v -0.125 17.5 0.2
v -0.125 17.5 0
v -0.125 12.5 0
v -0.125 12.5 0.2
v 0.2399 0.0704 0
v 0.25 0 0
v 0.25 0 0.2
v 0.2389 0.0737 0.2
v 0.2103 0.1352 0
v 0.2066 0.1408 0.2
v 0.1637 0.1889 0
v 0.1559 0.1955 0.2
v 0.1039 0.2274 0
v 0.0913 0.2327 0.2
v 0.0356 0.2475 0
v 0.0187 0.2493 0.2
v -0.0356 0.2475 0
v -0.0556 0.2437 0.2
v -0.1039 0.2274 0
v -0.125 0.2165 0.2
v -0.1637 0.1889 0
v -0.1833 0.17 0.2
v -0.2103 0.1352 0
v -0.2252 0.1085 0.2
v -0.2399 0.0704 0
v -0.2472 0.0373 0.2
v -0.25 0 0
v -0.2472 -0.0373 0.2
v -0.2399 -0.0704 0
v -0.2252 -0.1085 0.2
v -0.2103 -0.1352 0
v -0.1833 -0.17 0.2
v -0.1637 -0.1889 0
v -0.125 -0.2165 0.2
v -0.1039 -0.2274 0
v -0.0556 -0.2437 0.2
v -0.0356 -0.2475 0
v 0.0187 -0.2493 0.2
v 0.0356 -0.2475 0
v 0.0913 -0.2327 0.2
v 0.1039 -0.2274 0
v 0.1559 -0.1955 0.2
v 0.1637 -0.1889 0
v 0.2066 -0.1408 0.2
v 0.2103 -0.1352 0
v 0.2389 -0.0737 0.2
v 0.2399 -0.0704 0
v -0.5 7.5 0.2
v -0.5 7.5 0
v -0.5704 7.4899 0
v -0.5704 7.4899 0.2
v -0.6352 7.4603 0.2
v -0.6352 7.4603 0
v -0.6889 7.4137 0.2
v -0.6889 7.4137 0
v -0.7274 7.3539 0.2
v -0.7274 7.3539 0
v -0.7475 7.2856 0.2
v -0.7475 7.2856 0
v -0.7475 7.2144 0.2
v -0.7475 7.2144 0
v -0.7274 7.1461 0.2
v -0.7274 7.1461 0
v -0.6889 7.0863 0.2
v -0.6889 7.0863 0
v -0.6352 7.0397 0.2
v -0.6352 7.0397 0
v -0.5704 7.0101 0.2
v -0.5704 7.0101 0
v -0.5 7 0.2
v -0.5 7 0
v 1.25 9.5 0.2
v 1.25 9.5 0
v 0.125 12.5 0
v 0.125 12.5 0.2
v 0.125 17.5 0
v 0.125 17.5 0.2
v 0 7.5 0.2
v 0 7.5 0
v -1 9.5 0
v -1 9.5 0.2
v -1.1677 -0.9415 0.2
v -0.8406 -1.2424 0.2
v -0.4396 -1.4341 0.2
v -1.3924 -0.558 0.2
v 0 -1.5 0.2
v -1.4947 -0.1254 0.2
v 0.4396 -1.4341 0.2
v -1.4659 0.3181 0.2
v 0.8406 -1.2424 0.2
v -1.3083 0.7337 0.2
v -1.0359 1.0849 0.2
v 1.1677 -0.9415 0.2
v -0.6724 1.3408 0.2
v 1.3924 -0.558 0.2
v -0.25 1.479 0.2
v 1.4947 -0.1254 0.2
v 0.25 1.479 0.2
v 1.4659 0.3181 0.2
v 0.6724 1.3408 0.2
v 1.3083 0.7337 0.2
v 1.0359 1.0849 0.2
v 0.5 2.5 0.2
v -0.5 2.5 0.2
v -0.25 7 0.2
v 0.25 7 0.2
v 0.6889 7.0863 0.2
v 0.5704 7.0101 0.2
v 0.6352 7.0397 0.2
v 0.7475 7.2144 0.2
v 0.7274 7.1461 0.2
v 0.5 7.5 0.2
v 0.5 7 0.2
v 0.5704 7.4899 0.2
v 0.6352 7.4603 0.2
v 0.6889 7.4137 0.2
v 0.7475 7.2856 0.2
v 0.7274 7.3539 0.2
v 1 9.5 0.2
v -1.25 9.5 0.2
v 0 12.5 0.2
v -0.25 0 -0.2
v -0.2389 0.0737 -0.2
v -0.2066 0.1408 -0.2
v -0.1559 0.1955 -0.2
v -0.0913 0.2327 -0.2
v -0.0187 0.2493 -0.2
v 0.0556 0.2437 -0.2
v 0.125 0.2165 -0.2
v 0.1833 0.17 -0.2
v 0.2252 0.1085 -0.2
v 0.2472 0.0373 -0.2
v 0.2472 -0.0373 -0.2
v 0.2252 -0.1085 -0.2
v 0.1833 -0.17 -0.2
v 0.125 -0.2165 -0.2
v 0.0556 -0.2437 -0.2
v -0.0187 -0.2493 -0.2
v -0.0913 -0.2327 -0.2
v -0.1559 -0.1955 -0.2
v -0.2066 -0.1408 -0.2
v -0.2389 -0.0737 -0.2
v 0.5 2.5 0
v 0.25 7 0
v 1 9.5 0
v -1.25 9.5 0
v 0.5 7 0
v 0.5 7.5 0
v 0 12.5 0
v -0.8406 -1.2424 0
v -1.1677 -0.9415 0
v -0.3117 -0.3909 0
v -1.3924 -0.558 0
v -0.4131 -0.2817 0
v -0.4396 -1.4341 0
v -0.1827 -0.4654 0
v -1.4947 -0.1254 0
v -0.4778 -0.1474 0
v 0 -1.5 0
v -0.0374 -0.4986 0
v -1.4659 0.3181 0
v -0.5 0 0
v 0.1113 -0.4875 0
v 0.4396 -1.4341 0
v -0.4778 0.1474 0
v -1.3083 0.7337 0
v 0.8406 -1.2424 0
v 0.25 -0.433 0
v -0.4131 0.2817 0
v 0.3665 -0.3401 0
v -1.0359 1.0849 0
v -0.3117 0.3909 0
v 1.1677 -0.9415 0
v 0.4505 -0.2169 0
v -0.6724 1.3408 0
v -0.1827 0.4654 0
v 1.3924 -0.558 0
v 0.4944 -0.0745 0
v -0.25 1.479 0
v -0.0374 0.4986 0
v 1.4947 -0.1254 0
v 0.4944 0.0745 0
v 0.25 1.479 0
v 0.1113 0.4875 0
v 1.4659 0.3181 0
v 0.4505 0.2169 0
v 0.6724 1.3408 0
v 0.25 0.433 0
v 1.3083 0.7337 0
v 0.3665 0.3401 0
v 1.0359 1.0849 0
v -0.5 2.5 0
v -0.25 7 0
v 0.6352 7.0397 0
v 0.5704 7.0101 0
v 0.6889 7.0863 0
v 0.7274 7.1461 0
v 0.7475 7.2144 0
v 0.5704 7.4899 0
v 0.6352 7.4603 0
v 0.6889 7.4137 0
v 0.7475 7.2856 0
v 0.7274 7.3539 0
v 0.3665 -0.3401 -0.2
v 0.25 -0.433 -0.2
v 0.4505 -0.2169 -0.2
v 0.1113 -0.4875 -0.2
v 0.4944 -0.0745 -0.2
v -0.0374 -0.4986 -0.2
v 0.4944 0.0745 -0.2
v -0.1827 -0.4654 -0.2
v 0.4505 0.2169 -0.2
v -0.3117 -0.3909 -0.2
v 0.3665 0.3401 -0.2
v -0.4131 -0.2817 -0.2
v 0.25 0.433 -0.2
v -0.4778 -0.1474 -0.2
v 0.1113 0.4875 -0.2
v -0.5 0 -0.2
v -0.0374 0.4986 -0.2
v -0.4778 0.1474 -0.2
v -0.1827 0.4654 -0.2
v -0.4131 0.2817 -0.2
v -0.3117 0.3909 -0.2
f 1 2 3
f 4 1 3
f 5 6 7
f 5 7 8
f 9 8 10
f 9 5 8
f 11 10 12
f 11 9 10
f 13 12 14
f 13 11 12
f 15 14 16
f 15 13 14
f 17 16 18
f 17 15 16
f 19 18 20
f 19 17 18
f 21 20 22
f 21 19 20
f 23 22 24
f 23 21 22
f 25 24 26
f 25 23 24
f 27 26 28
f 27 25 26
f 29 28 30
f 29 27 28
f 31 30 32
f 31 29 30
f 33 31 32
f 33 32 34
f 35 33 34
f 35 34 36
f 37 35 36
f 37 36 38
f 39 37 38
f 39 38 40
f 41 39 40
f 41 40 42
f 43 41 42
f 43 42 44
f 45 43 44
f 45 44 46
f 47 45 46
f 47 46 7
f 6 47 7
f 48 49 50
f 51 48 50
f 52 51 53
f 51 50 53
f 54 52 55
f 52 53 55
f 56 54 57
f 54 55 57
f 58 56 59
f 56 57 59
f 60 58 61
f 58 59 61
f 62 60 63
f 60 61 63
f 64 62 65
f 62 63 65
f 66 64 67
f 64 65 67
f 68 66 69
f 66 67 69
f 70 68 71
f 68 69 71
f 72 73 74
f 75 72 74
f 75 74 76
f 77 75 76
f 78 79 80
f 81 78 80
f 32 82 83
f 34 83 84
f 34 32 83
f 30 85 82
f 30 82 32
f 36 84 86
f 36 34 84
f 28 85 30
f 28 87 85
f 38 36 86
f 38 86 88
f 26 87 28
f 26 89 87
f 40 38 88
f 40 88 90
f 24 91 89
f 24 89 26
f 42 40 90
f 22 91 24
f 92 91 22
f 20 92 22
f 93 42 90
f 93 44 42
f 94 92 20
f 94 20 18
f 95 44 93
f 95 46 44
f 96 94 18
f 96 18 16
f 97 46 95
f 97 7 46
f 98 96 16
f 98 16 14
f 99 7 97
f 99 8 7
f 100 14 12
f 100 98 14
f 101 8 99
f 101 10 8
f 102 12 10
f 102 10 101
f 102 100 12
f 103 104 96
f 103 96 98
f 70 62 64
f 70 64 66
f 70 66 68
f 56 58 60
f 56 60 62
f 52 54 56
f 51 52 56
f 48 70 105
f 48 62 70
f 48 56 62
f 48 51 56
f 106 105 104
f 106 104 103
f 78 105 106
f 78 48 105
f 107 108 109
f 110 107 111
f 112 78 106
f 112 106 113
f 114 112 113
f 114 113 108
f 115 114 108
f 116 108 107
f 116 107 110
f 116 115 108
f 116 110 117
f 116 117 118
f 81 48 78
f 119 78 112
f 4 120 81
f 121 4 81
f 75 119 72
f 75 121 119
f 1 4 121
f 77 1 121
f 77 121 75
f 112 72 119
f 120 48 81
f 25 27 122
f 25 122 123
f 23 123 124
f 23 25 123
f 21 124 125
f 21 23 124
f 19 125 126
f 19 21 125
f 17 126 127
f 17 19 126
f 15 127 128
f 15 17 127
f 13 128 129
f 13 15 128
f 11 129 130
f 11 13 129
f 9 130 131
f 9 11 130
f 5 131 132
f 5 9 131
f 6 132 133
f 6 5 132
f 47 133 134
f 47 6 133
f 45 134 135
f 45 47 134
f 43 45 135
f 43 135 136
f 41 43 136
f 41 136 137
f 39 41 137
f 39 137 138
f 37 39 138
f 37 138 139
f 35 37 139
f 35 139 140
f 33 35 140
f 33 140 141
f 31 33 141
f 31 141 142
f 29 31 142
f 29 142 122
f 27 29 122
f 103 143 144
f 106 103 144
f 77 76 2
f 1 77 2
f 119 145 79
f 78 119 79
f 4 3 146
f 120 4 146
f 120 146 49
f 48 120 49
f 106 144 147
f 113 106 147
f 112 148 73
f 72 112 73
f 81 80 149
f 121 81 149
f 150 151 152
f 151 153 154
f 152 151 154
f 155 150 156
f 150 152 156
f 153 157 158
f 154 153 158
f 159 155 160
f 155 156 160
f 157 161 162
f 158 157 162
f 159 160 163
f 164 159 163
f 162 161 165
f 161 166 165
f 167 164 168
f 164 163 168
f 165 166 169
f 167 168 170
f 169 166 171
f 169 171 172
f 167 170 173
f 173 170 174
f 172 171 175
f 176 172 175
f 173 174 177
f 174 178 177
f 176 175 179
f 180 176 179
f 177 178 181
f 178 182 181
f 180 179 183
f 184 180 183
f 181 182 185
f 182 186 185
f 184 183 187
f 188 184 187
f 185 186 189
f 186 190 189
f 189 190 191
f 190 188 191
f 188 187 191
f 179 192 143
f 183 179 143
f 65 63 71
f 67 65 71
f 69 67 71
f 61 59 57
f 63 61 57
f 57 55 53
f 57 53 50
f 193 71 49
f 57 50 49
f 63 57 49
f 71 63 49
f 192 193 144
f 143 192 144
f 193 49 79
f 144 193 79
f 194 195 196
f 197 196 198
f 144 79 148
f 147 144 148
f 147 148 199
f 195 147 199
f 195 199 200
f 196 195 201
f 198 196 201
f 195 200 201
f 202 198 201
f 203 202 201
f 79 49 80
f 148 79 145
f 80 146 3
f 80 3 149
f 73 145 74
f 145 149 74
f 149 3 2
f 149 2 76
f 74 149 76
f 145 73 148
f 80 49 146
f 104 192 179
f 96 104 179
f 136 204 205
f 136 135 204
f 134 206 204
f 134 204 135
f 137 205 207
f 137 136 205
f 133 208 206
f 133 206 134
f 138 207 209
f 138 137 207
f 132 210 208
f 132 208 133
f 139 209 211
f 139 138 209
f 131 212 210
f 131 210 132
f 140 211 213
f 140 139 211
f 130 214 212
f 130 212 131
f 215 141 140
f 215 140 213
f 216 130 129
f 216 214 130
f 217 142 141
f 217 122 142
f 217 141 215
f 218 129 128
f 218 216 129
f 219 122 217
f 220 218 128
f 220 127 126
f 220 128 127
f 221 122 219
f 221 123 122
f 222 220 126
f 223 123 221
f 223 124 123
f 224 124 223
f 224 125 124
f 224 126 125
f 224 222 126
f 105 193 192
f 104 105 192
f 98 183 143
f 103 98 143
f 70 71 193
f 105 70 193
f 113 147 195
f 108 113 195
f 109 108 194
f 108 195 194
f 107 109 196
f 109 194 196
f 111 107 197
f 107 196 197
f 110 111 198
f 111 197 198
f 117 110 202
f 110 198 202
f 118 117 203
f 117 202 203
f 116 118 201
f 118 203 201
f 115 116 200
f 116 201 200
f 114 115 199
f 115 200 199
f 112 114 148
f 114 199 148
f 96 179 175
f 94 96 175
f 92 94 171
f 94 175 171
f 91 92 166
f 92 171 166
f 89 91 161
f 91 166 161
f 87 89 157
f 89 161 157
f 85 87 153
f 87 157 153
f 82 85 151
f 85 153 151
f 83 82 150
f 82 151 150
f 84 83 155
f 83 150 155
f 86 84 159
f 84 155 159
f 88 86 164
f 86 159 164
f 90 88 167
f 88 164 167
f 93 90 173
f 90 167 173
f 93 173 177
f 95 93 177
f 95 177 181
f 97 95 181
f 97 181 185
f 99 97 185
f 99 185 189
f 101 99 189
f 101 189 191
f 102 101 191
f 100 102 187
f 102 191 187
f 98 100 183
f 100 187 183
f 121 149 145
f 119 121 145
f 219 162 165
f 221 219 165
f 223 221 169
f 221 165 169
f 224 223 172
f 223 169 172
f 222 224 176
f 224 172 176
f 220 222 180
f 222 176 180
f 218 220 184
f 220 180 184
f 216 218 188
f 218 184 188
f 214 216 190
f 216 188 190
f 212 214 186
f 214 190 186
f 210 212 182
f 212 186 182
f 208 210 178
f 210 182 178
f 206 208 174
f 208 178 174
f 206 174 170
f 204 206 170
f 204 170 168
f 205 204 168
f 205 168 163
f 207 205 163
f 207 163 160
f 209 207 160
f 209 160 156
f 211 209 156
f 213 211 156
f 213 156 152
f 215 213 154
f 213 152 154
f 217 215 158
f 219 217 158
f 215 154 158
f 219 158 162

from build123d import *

# Parameters (mm, degrees)
CROQUIS1_R              = 0.25
SALIENTE_EXTRUIR1_DEPTH = 0.2
CROQUIS2_R              = 0.5
CROQUIS2_R_2            = 0.25
SALIENTE_EXTRUIR2_DEPTH = 0.2


with BuildPart() as part:
    # Croquis1 → Saliente-Extruir1 (new body)
    with BuildSketch(Plane.XY):
        with BuildLine():
            Line((-0.5, 7), (-0.25, 7))
            Line((-0.25, 7), (-0.5, 2.5))
            Line((-0.5, 2.5), (-0.25, 1.479019946))
            ThreePointArc((-0.25, 1.479019946), (0, -1.5), (0.25, 1.479019946))
            Line((0.25, 1.479019946), (0.5, 2.5))
            Line((0.5, 2.5), (0.25, 7))
            Line((0.25, 7), (0.5, 7))
            ThreePointArc((0.5, 7), (0.75, 7.25), (0.5, 7.5))
            Line((0.5, 7.5), (1.25, 9.5))
            Line((1.25, 9.5), (0.125, 12.5))
            Line((0.125, 12.5), (0.125, 17.5))
            Line((0.125, 17.5), (-0.125, 17.5))
            Line((-0.125, 17.5), (-0.125, 12.5))
            Line((-0.125, 12.5), (-1.25, 9.5))
            Line((-1.25, 9.5), (-0.5, 7.5))
            ThreePointArc((-0.5, 7.5), (-0.75, 7.25), (-0.5, 7))
        make_face()
        Circle(CROQUIS1_R, mode=Mode.SUBTRACT)
        Polygon((0, 7.5), (-1, 9.5), (0, 12.5), (1, 9.5), align=None, mode=Mode.SUBTRACT)
    extrude(amount=SALIENTE_EXTRUIR1_DEPTH)

    # Croquis2 → Saliente-Extruir2 (add)
    with BuildSketch(Plane(origin=(0, 0, 0), x_dir=(-1, 0, 0), z_dir=(0, 0, -1))):
        Circle(CROQUIS2_R)
        Circle(CROQUIS2_R_2, mode=Mode.SUBTRACT)
    extrude(amount=SALIENTE_EXTRUIR2_DEPTH)


solid = part.part
